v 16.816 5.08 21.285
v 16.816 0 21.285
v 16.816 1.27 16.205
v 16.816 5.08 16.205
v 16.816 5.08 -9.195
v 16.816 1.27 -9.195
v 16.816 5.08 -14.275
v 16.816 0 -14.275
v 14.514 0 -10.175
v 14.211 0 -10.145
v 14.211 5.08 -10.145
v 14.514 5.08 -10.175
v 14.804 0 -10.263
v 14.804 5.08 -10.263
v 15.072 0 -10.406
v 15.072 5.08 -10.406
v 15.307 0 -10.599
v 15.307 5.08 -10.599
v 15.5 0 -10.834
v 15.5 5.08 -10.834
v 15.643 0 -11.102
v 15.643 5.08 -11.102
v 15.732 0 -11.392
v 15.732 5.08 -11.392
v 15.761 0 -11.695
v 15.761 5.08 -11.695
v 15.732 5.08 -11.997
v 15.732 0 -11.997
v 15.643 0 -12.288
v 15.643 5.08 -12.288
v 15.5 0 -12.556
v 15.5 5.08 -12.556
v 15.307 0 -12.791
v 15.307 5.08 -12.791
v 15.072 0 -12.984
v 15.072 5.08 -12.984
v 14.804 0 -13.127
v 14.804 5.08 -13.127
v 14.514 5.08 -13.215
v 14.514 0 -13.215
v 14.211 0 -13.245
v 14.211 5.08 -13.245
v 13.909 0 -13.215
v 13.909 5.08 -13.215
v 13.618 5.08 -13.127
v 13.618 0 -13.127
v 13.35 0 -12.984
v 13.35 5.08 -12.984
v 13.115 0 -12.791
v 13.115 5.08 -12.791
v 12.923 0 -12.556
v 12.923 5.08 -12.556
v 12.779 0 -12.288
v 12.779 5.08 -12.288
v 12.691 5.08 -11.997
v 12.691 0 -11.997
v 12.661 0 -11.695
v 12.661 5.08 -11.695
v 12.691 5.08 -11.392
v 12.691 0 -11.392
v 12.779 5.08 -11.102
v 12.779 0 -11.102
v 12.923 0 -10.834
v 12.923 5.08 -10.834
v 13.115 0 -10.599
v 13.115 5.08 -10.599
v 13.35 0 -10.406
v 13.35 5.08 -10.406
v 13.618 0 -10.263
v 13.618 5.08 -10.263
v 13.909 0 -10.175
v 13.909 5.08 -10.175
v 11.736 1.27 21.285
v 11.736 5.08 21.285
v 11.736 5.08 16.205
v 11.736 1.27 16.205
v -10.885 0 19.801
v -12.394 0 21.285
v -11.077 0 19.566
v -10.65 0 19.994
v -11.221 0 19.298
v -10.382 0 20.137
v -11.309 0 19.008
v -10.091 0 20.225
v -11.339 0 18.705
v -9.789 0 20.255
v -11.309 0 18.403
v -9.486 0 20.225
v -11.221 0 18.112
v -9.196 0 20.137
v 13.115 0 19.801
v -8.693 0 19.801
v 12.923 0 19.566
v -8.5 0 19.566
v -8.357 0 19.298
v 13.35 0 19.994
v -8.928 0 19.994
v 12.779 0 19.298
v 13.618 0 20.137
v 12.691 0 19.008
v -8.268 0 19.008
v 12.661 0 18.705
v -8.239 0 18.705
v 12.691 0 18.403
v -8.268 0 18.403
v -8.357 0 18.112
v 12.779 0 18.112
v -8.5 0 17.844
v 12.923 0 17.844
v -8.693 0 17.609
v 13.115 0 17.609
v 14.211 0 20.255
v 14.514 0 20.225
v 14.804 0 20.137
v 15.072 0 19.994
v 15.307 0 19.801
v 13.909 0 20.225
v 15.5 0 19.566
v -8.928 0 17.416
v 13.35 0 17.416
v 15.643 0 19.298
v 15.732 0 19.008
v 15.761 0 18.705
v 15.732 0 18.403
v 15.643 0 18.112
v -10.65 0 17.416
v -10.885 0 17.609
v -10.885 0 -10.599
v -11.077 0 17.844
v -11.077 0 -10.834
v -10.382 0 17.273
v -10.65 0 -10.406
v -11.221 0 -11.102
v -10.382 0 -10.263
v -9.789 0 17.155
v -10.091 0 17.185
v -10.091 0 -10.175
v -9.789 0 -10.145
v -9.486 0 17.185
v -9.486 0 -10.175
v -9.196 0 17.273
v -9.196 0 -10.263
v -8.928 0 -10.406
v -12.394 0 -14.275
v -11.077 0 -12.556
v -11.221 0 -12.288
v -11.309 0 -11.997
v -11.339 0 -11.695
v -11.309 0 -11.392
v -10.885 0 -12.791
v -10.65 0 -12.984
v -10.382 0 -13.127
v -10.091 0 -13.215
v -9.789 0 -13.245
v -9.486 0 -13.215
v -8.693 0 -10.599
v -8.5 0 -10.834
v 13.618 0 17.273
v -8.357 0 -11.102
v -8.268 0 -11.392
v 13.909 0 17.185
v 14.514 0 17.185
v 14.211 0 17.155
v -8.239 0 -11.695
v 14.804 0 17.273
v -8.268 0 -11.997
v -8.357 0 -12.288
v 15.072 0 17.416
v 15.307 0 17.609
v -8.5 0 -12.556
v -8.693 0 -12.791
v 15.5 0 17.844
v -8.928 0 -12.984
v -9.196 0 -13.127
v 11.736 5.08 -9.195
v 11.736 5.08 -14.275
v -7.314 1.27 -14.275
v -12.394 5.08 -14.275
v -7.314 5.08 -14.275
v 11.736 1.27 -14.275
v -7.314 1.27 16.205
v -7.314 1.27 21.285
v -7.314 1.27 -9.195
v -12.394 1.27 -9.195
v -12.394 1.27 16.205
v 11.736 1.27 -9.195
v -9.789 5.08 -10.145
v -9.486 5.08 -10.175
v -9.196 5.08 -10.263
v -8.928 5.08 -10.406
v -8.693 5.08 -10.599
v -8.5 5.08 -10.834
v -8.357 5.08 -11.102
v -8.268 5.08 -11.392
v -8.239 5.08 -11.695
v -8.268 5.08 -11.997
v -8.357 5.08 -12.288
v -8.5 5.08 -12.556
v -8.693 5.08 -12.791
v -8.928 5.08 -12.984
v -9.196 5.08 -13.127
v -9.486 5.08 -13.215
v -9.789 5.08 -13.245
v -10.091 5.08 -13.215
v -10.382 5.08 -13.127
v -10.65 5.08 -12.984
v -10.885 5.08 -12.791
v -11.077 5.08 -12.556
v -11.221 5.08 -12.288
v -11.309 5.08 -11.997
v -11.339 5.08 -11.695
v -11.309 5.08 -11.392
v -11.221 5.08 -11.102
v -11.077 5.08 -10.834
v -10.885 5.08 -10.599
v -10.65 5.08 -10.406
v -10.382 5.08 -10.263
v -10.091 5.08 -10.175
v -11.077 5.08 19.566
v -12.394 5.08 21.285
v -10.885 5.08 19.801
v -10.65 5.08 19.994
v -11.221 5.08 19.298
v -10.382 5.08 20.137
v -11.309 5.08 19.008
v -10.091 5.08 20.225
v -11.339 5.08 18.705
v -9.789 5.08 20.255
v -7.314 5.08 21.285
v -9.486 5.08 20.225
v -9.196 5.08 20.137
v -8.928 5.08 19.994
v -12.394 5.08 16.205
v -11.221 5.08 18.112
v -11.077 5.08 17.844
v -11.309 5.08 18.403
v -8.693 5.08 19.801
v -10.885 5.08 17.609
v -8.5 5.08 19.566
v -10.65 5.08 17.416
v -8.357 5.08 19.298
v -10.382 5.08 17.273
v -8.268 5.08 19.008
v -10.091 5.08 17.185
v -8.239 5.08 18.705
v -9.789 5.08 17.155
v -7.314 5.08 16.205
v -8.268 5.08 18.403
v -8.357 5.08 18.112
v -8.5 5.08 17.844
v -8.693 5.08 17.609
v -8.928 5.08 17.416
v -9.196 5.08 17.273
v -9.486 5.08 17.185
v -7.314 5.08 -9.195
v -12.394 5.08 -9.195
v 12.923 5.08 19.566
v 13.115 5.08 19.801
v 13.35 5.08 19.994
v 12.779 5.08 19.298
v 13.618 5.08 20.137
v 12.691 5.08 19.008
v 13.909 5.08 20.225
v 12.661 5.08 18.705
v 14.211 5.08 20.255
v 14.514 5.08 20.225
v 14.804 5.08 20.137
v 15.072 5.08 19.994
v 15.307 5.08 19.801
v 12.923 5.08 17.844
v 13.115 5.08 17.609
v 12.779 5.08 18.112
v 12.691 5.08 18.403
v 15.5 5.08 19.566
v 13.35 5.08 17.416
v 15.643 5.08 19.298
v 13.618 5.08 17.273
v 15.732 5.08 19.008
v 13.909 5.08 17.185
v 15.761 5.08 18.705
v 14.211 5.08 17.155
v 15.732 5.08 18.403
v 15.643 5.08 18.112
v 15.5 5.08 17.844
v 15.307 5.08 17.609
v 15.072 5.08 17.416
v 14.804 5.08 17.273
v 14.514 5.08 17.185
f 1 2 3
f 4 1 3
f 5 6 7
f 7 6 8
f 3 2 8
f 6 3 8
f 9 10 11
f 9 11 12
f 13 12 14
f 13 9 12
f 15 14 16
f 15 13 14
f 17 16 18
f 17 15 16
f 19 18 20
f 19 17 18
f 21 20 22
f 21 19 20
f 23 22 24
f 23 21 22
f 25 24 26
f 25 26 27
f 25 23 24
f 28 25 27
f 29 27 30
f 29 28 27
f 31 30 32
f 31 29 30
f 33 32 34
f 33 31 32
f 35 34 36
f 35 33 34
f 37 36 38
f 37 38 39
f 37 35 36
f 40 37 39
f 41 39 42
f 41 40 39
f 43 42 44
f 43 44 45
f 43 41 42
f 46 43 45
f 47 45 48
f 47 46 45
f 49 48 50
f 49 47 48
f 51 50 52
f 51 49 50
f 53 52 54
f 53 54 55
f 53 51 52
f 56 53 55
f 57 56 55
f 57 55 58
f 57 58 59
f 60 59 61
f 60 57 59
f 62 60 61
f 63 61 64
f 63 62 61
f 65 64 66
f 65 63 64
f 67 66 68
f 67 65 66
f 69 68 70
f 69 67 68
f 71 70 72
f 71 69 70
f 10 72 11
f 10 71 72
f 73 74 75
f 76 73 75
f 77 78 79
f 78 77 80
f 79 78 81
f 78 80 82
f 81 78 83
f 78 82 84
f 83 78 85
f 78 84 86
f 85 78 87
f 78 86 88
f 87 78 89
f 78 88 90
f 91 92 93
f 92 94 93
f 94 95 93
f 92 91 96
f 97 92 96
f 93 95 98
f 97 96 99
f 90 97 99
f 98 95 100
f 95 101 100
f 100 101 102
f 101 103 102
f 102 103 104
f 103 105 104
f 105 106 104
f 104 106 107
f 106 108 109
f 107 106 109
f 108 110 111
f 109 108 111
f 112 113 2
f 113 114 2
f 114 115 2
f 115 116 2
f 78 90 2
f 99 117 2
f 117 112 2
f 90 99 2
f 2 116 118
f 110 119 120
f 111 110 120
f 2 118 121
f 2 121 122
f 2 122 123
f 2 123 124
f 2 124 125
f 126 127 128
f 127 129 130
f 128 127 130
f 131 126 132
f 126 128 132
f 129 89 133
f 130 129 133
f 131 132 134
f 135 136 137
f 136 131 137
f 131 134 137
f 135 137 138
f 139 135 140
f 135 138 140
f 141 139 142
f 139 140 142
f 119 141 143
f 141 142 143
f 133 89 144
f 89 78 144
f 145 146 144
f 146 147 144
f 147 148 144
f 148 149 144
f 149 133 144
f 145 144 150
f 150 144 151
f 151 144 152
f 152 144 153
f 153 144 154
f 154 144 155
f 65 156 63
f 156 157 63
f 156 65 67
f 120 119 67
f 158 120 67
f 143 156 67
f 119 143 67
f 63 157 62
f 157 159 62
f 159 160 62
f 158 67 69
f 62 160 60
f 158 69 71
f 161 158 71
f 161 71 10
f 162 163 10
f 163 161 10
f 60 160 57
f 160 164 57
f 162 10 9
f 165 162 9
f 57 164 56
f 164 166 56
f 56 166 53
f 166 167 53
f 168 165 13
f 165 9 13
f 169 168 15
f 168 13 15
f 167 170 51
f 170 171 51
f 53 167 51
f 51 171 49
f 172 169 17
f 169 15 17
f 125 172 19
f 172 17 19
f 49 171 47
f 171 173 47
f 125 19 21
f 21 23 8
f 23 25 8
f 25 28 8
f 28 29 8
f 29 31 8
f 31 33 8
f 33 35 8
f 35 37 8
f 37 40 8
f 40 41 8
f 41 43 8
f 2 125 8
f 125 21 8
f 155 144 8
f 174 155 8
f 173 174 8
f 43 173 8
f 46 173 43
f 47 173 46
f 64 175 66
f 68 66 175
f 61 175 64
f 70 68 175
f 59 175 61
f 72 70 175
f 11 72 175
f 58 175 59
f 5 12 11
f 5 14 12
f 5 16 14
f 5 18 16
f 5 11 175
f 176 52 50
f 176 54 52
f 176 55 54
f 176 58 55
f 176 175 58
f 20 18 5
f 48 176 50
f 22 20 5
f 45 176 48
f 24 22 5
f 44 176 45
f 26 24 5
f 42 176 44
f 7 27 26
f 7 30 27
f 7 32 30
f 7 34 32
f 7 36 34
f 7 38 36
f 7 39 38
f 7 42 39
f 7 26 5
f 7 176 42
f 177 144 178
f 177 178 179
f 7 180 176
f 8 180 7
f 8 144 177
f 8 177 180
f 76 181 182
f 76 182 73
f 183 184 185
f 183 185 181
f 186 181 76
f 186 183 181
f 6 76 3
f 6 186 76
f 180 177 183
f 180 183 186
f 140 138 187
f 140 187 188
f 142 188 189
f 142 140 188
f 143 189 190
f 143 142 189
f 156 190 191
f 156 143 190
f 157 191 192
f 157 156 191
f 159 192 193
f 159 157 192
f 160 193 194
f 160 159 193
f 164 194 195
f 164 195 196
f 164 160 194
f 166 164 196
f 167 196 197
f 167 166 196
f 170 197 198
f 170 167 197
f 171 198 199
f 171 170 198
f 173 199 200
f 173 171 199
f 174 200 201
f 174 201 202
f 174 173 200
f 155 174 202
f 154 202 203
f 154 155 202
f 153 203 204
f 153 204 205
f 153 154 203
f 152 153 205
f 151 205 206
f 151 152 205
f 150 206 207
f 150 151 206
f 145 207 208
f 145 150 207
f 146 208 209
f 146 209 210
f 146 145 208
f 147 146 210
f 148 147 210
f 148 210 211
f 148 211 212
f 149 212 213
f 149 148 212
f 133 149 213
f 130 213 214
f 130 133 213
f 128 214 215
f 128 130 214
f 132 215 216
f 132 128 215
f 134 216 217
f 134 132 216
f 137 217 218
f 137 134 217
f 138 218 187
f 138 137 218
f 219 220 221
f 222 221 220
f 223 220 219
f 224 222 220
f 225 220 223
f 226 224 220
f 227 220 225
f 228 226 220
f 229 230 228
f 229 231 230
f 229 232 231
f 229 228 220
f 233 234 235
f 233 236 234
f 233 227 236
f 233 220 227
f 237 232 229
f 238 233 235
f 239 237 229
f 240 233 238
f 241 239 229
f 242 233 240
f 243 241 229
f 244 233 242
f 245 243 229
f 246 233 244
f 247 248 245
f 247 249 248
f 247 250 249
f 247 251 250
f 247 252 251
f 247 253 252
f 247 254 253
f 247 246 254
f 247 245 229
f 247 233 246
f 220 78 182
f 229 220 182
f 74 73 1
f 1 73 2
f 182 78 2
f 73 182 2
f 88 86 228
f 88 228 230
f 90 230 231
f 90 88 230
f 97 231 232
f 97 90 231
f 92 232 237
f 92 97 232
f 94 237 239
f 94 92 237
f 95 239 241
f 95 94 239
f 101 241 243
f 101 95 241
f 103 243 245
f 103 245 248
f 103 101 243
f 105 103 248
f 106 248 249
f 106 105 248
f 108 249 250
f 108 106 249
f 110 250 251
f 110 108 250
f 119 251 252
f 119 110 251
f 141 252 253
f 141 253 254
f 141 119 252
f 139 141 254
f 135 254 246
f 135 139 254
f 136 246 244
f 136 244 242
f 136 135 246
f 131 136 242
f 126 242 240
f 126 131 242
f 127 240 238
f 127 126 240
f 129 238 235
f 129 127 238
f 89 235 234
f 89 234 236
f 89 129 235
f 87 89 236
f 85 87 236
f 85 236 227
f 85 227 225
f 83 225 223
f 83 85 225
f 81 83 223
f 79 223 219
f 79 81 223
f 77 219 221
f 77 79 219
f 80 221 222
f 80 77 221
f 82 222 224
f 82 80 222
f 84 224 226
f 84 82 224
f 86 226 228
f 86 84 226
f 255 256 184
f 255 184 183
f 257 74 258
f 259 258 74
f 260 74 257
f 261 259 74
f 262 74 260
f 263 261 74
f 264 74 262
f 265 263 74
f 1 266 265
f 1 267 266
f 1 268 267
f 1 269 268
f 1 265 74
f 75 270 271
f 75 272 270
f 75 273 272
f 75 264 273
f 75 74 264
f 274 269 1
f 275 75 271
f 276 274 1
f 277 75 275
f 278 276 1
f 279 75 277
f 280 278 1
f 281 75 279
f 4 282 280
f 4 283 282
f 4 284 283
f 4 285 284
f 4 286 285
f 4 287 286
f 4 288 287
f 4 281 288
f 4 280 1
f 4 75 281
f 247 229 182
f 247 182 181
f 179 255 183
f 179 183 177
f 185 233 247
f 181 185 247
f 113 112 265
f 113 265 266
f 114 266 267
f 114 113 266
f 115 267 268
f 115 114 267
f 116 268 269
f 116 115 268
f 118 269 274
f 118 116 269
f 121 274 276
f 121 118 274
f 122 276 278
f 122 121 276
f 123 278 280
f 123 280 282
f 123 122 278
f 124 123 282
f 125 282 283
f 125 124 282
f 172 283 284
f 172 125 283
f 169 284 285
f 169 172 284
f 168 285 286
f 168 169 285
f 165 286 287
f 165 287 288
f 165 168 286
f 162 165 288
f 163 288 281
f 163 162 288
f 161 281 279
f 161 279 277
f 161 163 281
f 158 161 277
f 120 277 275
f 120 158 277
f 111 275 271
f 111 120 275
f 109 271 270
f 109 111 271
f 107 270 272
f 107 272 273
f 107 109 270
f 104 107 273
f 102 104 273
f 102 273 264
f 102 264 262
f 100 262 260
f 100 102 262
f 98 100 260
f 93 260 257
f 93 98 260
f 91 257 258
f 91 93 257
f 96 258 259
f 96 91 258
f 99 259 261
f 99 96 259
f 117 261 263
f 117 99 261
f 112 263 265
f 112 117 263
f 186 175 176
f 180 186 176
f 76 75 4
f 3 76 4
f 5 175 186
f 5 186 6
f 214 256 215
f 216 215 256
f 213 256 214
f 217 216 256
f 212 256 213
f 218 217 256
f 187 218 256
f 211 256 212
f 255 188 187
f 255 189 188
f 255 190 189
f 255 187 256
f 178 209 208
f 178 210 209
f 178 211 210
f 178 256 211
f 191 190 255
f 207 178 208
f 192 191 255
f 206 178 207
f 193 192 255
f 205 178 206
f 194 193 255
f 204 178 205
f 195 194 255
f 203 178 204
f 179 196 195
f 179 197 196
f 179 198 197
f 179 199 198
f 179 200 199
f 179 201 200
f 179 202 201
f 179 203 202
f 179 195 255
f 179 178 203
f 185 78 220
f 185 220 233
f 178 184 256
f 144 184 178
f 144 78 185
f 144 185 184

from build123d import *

# Parameters (mm, degrees)
SKETCH1_W           = 29.21
SKETCH1_H           = 35.56
SKETCH1_R           = 1.5499969
BOSS_EXTRUDE1_DEPTH = 5.08
SKETCH2_W           = 5.08
SKETCH2_H           = 25.4
SKETCH2_W_2         = 19.05
SKETCH2_H_2         = 5.08
CUT_EXTRUDE1_DEPTH  = 3.81


with BuildPart() as part:
    # Sketch1 → Boss-Extrude1 (new body)
    with BuildSketch(Plane(origin=(0, 0, 0), x_dir=(1, 0, 0), z_dir=(0, 1, 0))):
        with Locations((2.211294118, -3.505162647)):
            Rectangle(SKETCH1_W, SKETCH1_H)
        with Locations(Location((-9.788707282, 11.694832353, 0), (0, 0, 270))):
            Circle(SKETCH1_R, mode=Mode.SUBTRACT)
        with Locations(Location((14.211295518, 11.694832353, 0), (0, 0, 270))):
            Circle(SKETCH1_R, mode=Mode.SUBTRACT)
        with Locations(Location((14.211295518, -18.705157647, 0), (0, 0, 270))):
            Circle(SKETCH1_R, mode=Mode.SUBTRACT)
        with Locations(Location((-9.788707282, -18.705157647, 0), (0, 0, 270))):
            Circle(SKETCH1_R, mode=Mode.SUBTRACT)
    extrude(amount=BOSS_EXTRUDE1_DEPTH)

    # Sketch2 → Cut-Extrude1 (cut)
    with BuildSketch(Plane(origin=(0, 5.08, 0), x_dir=(1, 0, 0), z_dir=(0, 1, 0))):
        with Locations((-9.853705882, -3.505162647)):
            Rectangle(SKETCH2_W, SKETCH2_H)
        with Locations((2.211294118, 11.734837353)):
            Rectangle(SKETCH2_W_2, SKETCH2_H_2)
        with Locations((14.276294118, -3.505162647)):
            Rectangle(SKETCH2_W, SKETCH2_H)
        with Locations((2.211294118, -3.505162647)):
            Rectangle(SKETCH2_W_2, SKETCH2_H)
        with Locations((2.211294118, -18.745162647)):
            Rectangle(SKETCH2_W_2, SKETCH2_H_2)
    extrude(amount=-CUT_EXTRUDE1_DEPTH, mode=Mode.SUBTRACT)


solid = part.part
